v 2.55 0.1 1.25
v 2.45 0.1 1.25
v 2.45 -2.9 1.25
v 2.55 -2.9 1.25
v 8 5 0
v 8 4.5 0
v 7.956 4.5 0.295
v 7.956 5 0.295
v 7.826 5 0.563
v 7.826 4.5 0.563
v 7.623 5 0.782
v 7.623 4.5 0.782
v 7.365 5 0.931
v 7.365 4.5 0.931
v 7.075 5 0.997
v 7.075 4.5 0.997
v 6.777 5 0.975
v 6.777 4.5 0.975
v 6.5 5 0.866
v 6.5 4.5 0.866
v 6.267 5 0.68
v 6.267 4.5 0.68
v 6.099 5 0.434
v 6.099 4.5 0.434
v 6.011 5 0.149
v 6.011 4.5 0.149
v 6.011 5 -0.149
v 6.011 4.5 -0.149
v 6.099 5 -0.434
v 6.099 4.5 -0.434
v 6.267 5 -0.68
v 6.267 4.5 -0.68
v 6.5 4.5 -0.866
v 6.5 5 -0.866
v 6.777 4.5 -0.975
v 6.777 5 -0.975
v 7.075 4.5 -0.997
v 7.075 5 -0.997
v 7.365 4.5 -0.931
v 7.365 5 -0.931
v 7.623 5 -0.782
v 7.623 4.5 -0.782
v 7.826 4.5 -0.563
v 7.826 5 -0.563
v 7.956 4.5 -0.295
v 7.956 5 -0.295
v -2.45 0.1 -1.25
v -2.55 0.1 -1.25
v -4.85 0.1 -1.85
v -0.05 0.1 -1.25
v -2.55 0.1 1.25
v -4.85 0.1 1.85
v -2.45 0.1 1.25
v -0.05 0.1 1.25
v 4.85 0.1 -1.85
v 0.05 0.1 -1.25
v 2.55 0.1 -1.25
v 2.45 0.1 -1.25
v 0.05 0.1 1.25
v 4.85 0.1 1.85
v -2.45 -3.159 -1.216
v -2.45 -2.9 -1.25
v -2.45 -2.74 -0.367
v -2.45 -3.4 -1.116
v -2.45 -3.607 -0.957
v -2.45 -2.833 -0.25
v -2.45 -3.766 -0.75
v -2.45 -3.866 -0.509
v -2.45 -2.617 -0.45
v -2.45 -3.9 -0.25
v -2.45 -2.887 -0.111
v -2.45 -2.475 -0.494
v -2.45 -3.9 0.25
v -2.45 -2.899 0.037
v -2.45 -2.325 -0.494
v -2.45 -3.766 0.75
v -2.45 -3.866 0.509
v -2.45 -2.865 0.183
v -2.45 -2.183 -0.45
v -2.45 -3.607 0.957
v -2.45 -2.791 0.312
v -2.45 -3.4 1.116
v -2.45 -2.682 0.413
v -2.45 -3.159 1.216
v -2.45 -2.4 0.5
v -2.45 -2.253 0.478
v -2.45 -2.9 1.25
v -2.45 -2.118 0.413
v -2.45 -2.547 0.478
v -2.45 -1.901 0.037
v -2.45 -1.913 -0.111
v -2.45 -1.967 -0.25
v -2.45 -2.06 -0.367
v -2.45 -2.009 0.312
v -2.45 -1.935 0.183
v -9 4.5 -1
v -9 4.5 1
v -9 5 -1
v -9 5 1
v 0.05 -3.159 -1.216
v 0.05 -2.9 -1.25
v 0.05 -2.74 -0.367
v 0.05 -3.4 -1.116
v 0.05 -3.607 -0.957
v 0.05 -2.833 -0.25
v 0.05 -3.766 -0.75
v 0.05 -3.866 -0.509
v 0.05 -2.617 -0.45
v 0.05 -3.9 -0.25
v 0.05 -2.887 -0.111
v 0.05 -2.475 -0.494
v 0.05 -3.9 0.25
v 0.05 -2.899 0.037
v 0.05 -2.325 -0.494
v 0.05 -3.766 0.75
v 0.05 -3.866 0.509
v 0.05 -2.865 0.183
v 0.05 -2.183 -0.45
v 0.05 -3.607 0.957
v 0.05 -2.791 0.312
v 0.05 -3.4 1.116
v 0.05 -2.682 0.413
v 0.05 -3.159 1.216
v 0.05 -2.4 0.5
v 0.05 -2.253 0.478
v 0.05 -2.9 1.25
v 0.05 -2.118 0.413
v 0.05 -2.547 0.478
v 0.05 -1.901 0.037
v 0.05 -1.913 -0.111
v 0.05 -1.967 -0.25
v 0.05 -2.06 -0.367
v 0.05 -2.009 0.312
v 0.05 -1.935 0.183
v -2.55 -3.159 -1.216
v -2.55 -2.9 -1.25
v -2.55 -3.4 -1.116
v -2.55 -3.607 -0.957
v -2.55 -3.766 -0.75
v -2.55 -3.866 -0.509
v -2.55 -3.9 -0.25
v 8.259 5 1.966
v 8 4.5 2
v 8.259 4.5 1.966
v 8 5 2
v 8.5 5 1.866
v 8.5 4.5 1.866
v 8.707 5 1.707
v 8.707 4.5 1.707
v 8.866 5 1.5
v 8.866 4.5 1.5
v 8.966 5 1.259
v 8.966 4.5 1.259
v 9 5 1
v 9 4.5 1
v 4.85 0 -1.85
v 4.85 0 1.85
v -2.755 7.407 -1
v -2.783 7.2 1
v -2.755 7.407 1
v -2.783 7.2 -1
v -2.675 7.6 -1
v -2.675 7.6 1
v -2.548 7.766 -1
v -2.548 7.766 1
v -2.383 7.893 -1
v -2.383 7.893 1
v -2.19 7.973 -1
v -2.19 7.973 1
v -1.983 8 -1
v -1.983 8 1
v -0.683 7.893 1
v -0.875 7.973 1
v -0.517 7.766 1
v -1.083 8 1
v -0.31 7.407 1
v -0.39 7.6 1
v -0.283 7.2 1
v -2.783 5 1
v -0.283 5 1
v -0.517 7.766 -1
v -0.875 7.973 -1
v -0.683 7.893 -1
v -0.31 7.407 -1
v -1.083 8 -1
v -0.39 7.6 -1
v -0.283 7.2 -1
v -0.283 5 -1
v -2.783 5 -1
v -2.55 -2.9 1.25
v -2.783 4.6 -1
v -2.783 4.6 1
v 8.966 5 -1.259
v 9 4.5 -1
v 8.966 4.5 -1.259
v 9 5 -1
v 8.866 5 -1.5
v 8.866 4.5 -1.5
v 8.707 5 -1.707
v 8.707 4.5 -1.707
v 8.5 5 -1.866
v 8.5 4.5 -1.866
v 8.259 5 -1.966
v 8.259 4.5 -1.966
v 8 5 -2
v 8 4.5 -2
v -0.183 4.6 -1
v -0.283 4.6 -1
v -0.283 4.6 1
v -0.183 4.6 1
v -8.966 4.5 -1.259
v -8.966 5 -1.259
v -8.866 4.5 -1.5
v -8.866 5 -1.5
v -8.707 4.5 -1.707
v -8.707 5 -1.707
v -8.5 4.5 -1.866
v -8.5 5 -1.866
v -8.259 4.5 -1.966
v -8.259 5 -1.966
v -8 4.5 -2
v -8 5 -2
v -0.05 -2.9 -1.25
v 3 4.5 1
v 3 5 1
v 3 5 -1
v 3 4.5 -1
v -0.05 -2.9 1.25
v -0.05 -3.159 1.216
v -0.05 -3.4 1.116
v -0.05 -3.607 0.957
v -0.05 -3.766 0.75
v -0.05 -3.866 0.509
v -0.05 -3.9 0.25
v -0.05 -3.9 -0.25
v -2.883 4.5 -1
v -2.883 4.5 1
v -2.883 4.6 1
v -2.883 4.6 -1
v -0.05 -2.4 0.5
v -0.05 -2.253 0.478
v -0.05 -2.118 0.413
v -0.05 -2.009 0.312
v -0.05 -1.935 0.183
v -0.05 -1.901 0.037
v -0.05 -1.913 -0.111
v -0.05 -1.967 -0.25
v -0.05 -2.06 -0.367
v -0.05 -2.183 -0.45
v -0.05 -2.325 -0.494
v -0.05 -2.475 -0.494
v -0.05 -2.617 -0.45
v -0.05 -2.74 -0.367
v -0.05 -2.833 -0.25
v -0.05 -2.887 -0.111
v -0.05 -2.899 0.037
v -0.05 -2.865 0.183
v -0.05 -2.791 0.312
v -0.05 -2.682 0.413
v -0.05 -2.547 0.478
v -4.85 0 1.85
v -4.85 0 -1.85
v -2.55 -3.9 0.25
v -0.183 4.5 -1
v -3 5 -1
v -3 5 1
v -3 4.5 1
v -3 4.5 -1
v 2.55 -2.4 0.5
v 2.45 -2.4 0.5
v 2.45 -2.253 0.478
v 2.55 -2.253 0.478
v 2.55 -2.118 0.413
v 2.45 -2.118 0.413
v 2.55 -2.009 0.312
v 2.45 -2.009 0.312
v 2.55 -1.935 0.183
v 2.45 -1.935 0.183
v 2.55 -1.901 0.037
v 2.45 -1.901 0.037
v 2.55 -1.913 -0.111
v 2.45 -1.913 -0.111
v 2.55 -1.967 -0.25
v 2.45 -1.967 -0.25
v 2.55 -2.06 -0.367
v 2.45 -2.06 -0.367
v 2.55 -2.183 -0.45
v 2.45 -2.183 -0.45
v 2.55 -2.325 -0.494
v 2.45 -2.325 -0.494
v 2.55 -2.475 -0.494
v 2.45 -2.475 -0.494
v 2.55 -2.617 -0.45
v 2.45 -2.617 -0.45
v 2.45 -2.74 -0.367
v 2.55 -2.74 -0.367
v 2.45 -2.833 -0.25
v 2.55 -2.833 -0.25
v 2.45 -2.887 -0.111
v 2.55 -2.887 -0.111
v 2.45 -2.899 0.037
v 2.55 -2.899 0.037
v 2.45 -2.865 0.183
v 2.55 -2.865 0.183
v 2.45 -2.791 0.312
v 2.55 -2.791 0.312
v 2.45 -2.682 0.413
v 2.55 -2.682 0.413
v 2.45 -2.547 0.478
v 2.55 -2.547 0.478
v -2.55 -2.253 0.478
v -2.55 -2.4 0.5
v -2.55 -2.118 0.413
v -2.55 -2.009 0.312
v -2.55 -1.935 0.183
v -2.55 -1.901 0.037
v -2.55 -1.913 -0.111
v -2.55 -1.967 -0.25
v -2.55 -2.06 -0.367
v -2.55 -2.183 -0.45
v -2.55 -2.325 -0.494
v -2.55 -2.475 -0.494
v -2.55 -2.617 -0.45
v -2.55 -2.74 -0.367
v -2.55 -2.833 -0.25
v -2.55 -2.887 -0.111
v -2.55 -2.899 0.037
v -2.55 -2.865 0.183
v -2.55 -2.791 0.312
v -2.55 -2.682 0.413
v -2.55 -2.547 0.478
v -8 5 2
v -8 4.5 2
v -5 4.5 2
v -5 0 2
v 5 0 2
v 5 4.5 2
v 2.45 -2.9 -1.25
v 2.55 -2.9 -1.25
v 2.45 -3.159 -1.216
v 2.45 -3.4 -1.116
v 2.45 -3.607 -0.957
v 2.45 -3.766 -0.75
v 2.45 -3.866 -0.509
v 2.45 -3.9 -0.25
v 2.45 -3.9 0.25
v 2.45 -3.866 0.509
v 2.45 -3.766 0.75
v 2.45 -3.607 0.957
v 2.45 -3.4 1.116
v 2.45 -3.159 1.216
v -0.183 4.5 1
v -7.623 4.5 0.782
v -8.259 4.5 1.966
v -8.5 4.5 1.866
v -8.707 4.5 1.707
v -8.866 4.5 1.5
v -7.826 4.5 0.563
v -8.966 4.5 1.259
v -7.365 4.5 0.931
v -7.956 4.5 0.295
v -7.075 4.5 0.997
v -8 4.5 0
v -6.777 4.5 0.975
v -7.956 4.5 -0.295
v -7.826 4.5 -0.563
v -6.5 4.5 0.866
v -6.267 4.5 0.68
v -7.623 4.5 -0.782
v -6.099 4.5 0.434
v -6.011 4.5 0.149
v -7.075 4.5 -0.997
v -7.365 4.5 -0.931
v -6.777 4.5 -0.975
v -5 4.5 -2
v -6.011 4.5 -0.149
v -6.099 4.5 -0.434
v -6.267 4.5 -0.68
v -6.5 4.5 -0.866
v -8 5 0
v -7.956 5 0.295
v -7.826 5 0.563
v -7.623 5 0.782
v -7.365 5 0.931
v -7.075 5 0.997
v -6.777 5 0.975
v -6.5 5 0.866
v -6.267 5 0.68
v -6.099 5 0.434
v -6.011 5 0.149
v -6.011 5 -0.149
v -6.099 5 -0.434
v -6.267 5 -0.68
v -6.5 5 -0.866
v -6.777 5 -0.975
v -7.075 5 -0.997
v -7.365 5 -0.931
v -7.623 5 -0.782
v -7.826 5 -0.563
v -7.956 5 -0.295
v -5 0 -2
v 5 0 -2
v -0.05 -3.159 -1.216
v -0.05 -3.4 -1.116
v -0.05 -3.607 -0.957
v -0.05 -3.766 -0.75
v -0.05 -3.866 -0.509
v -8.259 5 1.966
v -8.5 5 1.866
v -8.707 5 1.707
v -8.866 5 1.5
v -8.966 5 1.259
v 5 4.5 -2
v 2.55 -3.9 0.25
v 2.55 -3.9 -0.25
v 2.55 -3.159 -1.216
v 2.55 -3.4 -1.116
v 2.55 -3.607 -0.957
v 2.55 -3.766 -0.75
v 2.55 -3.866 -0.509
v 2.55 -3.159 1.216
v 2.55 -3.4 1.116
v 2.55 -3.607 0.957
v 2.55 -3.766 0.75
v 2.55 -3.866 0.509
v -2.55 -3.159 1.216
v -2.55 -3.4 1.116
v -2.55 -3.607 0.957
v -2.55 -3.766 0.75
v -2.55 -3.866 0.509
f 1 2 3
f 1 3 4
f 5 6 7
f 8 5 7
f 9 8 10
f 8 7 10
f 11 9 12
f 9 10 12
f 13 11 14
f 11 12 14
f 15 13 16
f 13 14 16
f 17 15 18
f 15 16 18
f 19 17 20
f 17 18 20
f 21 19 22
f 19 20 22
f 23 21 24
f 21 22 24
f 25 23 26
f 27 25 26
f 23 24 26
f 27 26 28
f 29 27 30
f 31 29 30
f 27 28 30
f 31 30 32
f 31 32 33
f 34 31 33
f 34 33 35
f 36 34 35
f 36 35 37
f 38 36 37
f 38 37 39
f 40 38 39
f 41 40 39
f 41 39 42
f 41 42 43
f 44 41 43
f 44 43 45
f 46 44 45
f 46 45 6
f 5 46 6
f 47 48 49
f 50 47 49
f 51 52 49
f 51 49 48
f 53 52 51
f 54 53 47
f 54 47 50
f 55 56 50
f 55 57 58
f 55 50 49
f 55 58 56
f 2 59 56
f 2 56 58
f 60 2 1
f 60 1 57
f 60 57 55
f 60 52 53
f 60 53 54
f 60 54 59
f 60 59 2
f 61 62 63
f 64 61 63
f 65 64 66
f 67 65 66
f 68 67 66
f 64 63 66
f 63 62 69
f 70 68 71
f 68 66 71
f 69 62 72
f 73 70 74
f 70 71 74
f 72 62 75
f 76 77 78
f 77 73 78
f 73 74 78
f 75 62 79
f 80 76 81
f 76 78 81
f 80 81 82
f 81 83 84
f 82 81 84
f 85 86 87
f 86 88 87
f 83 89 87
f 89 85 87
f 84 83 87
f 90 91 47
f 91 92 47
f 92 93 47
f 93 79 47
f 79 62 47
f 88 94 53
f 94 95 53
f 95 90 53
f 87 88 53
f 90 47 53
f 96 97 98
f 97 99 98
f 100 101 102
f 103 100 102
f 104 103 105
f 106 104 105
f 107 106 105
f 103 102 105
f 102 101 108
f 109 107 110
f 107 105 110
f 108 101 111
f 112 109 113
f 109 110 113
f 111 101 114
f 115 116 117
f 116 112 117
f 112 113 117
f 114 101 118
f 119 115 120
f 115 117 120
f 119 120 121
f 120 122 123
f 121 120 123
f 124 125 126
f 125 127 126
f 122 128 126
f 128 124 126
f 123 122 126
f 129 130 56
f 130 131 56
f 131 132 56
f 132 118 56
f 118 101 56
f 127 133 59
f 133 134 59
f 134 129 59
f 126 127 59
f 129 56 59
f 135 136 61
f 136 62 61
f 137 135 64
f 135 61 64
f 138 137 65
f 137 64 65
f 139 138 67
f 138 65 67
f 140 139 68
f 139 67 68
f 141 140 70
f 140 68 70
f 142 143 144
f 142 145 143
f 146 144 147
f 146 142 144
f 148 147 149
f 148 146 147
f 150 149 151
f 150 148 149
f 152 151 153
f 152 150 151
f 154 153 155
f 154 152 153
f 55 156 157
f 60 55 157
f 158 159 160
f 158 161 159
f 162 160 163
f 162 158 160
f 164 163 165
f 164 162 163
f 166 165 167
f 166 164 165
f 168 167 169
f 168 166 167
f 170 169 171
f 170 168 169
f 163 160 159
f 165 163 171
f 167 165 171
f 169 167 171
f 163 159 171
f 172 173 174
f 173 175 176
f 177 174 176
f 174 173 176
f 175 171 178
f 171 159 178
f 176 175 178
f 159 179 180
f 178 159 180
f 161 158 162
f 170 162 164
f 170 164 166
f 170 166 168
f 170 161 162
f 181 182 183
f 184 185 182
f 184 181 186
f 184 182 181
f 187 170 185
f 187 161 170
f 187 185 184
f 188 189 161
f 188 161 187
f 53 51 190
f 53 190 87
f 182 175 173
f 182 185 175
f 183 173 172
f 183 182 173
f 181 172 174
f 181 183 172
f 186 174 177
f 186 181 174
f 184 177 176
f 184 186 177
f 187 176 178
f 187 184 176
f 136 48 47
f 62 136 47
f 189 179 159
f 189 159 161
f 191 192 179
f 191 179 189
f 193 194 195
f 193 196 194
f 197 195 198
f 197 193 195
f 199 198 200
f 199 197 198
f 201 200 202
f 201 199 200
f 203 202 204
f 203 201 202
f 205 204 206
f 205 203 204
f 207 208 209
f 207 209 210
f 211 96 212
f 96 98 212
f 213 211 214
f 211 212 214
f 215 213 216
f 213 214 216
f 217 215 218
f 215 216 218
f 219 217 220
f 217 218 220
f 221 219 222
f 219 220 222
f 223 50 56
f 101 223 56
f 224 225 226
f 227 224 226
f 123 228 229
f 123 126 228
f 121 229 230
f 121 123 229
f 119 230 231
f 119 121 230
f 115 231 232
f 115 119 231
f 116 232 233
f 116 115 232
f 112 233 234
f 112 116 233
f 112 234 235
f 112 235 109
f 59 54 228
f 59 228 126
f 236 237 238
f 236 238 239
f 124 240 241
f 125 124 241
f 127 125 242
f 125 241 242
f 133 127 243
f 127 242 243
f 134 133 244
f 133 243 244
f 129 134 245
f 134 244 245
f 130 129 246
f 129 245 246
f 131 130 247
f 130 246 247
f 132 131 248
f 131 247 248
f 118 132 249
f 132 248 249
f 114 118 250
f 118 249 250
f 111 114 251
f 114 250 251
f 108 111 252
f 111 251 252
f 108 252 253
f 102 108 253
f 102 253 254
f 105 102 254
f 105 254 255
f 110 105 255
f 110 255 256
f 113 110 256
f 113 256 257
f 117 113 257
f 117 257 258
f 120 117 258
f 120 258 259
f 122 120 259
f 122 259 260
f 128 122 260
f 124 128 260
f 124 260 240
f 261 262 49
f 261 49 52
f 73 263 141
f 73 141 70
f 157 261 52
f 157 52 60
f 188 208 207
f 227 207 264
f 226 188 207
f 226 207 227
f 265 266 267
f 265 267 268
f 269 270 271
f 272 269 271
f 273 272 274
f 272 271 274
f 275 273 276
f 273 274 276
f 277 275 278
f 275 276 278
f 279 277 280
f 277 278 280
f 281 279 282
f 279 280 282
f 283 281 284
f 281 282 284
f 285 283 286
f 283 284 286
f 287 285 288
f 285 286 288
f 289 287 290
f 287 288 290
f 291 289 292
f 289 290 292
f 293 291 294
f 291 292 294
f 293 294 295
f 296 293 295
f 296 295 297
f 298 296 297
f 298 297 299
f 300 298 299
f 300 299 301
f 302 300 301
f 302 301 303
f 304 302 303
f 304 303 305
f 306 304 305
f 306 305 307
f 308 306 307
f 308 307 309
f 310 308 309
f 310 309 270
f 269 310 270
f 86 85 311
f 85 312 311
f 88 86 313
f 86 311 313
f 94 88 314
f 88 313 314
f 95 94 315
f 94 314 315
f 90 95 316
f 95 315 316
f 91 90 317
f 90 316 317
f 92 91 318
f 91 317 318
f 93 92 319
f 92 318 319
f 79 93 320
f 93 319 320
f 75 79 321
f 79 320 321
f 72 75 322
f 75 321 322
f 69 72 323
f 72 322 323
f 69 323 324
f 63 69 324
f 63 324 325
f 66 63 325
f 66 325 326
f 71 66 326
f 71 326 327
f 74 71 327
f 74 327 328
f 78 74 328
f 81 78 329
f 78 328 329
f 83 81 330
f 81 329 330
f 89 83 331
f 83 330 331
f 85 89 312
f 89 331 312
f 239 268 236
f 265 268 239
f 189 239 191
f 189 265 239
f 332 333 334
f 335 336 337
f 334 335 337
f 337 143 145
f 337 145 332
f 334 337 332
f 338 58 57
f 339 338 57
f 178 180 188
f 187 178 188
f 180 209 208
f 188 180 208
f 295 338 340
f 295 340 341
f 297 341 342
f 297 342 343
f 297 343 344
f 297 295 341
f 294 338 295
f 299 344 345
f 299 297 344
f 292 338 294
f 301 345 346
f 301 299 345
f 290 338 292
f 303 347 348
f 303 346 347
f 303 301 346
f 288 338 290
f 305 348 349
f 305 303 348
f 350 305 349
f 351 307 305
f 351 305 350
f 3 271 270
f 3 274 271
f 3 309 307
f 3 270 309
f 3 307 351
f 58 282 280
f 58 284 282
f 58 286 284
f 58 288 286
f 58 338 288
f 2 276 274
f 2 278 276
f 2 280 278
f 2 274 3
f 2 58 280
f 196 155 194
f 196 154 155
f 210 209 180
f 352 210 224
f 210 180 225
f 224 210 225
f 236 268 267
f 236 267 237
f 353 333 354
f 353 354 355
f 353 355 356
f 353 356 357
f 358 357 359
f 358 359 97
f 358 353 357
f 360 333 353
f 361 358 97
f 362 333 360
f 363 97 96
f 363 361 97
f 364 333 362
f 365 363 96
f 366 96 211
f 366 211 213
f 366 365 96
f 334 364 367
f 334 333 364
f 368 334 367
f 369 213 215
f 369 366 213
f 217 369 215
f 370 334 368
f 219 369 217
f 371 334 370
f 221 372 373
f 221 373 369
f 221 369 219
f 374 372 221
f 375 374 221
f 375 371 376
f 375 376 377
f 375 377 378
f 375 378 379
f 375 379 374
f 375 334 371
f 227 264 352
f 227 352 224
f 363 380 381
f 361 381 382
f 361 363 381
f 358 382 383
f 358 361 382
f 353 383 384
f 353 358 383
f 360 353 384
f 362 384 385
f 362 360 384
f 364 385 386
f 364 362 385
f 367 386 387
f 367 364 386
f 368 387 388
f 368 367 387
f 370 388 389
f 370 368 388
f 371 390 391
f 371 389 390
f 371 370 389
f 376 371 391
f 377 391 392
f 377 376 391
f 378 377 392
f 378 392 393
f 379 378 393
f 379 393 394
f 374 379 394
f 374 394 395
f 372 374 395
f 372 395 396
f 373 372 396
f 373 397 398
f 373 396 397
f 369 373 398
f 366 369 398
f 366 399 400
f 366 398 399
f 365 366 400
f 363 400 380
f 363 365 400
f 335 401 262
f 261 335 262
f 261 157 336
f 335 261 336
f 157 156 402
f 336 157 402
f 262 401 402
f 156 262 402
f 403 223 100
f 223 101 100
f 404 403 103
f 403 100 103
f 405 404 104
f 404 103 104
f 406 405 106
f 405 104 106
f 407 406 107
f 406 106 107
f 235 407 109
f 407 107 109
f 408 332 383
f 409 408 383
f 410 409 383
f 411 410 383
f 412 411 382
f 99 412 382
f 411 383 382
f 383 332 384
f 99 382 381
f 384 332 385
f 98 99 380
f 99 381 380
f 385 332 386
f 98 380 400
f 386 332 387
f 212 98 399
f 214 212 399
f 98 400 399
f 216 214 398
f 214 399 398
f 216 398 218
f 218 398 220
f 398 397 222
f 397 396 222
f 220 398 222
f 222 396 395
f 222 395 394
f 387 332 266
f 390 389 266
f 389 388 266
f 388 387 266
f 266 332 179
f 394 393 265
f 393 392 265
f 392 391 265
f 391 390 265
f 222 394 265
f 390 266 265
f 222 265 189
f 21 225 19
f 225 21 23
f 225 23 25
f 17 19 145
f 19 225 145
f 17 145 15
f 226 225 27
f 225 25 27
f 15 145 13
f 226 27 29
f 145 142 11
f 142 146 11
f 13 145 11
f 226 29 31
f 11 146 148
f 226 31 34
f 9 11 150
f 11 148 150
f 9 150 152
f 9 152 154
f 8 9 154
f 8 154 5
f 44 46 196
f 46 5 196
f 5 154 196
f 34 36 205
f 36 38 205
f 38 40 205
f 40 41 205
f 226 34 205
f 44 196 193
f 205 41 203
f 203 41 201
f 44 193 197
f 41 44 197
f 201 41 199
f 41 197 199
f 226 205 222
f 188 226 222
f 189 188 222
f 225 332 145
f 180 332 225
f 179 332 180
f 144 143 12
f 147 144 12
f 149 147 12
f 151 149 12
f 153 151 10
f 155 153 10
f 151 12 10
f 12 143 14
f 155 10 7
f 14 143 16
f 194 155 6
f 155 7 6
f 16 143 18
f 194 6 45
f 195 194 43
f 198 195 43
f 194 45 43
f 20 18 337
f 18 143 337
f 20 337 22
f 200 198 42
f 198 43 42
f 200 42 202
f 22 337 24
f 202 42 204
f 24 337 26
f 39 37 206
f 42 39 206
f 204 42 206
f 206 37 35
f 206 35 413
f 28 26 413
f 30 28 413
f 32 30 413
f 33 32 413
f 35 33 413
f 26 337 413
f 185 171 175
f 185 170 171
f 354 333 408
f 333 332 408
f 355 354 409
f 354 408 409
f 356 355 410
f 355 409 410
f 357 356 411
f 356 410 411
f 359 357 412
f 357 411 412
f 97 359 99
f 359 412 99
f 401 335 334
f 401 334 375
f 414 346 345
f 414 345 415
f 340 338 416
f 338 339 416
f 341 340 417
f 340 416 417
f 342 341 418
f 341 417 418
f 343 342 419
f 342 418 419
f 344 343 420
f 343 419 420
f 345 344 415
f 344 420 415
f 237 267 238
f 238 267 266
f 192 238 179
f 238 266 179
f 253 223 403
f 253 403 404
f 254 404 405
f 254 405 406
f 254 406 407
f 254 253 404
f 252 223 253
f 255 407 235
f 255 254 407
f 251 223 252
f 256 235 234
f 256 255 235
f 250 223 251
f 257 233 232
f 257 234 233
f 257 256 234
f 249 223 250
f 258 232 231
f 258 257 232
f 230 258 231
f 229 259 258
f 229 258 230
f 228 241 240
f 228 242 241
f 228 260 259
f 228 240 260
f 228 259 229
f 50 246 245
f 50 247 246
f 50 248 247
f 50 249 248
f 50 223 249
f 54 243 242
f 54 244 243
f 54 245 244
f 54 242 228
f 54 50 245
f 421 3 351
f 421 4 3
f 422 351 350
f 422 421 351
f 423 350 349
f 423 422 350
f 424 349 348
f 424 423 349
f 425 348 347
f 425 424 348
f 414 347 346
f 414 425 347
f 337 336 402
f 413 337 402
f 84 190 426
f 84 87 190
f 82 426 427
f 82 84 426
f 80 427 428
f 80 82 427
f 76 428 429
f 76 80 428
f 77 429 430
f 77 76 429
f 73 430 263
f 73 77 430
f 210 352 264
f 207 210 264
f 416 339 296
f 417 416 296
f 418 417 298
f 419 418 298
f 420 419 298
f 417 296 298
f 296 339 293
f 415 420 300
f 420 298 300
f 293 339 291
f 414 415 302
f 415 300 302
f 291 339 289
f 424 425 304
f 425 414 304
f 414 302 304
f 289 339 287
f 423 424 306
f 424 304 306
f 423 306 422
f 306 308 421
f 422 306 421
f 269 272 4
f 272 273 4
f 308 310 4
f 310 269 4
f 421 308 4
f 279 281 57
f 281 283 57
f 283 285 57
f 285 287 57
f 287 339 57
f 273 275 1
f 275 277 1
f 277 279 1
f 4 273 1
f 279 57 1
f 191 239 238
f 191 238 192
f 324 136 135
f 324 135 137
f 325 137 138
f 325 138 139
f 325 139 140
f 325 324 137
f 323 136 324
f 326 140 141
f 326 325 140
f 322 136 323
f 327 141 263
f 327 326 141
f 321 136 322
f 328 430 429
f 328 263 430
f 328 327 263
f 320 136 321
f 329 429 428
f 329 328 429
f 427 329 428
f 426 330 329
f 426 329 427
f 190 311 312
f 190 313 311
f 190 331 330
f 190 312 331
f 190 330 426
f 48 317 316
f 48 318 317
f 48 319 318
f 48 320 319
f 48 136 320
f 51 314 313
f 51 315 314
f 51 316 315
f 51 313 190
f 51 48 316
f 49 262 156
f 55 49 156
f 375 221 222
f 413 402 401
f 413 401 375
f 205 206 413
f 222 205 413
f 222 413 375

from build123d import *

# Parameters (mm, degrees)
SKETCH2_W                  = 10
SKETCH2_H                  = 4
BOSS_EXTRUDE1_DEPTH        = 5
SKETCH3_W                  = 6
SKETCH3_H                  = 2
CUT_EXTRUDE1_DEPTH         = 0.5
SKETCH4_W                  = 4
SKETCH4_H                  = 0.5
BOSS_EXTRUDE2_DEPTH        = 4
SKETCH5_R                  = 1
CUT_EXTRUDE2_DEPTH         = 1.5
FILLET1_R                  = 1
SKETCH6_W                  = 2.5
SKETCH6_H                  = 2
BOSS_EXTRUDE3_DEPTH        = 3.5
FILLET2_R                  = 0.8
SKETCH7_W                  = 0.1
SKETCH7_H                  = 2
BOSS_EXTRUDE4_DEPTH        = 0.1
SKETCH8_W                  = 9.7
SKETCH8_H                  = 3.7
CUT_EXTRUDE3_DEPTH         = 0.1
SKETCH9_W                  = 0.1
SKETCH9_H                  = 2.5
BOSS_EXTRUDE5_DEPTH        = 4
FILLET3_R                  = 1
SKETCH10_R                 = 0.5
CUT_EXTRUDE4_DEPTH         = 10.05
LPATTERN1_COUNT            = 2
LPATTERN1_PITCH            = 2.5
FILLET3_OF_LPATTERN1_R     = 1
LPATTERN1_COL_COUNT        = 2
LPATTERN1_COL_PITCH        = 2.5
FILLET3_OF_LPATTERN1_COL_R = 1


with BuildPart() as part:
    # Sketch2 → Boss-Extrude1 (new body)
    with BuildSketch(Plane(origin=(0, 0, 0), x_dir=(1, 0, 0), z_dir=(0, 1, 0))):
        Rectangle(SKETCH2_W, SKETCH2_H)
    extrude(amount=BOSS_EXTRUDE1_DEPTH)

    # Sketch3 → Cut-Extrude1 (cut)
    with BuildSketch(Plane(origin=(0, 5, 0), x_dir=(1, 0, 0), z_dir=(0, 1, 0))):
        Rectangle(SKETCH3_W, SKETCH3_H)
    extrude(amount=-CUT_EXTRUDE1_DEPTH, mode=Mode.SUBTRACT)

    # Sketch4 → Boss-Extrude2 (add)
    with BuildSketch(Plane(origin=(5, 0, 0), x_dir=(0, 0, -1), z_dir=(1, 0, 0))):
        with Locations((0, 4.75)):
            Rectangle(SKETCH4_W, SKETCH4_H)
    boss_extrude2 = extrude(amount=BOSS_EXTRUDE2_DEPTH)

    # Sketch5 → Cut-Extrude2 (cut, through all)
    with BuildSketch(Plane.XZ.offset(-4.5)):
        with Locations((7, 0)):
            Circle(SKETCH5_R)
    cut_extrude2 = extrude(amount=-CUT_EXTRUDE2_DEPTH, mode=Mode.SUBTRACT)

    # Mirror3: Boss-Extrude2, Cut-Extrude2 across plane
    add(boss_extrude2.mirror(Plane(origin=(0, 0, 0), x_dir=(0, 0, 1), z_dir=(1, 0, 0))))
    add(cut_extrude2.mirror(Plane(origin=(0, 0, 0), x_dir=(0, 0, 1), z_dir=(1, 0, 0))), mode=Mode.SUBTRACT)

    # Fillet1
    fillet1_edges = [part.edges().sort_by_distance(p)[0] for p in [
        (9, 4.75, 2),
        (9, 4.75, -2),
        (-9, 4.75, 2),
        (-9, 4.75, -2),
    ]]
    fillet(fillet1_edges, radius=FILLET1_R)

    # Sketch6 → Boss-Extrude3 (add)
    with BuildSketch(Plane(origin=(0, 4.5, 0), x_dir=(1, 0, 0), z_dir=(0, 1, 0))):
        with Locations((-1.53254506, 0)):
            Rectangle(SKETCH6_W, SKETCH6_H)
    extrude(amount=BOSS_EXTRUDE3_DEPTH)

    # Fillet2
    fillet2_edges = [part.edges().sort_by_distance(p)[0] for p in [
        (-2.78254506, 8, 0),
        (-0.28254506, 8, 0),
    ]]
    fillet(fillet2_edges, radius=FILLET2_R)

    # Sketch7 → Boss-Extrude4 (add)
    with BuildSketch(Plane(origin=(0, 4.5, 0), x_dir=(1, 0, 0), z_dir=(0, 1, 0))):
        with Locations((-0.23254506, 0)):
            Rectangle(SKETCH7_W, SKETCH7_H)
        with Locations((-2.83254506, 0)):
            Rectangle(SKETCH7_W, SKETCH7_H)
    extrude(amount=BOSS_EXTRUDE4_DEPTH)

    # Sketch8 → Cut-Extrude3 (cut)
    with BuildSketch(Plane.XZ):
        Rectangle(SKETCH8_W, SKETCH8_H)
    extrude(amount=-CUT_EXTRUDE3_DEPTH, mode=Mode.SUBTRACT)

    # Sketch9 → Boss-Extrude5 (add)
    with BuildSketch(Plane.XZ.offset(-0.1)):
        Rectangle(SKETCH9_W, SKETCH9_H)
    boss_extrude5 = extrude(amount=BOSS_EXTRUDE5_DEPTH)

    # Fillet3
    fillet3_edges = [part.edges().sort_by_distance(p)[0] for p in [
        (0, -3.9, 1.25),
        (0, -3.9, -1.25),
    ]]
    fillet(fillet3_edges, radius=FILLET3_R)

    # Sketch10 → Cut-Extrude4 (cut, through all)
    with BuildSketch(Plane.ZY.offset(0.05)):
        with Locations((0, -2.4)):
            Circle(SKETCH10_R)
    cut_extrude4 = extrude(amount=-CUT_EXTRUDE4_DEPTH, mode=Mode.SUBTRACT)

    # LPattern1: Boss-Extrude5, Cut-Extrude4 ×2
    with Locations(*[(i * LPATTERN1_PITCH, 0, 0) for i in range(1, LPATTERN1_COUNT)]):
        add(boss_extrude5)
        add(cut_extrude4, mode=Mode.SUBTRACT)

    # Fillet3 of LPattern1
    fillet3_of_lpattern1_edges = [part.edges().sort_by_distance(p)[0] for p in [
        (2.5, -3.9, 1.25),
        (2.5, -3.9, -1.25),
    ]]
    fillet(fillet3_of_lpattern1_edges, radius=FILLET3_OF_LPATTERN1_R)

    # LPattern1 col: Boss-Extrude5, Cut-Extrude4 ×2
    with Locations(*[(-i * LPATTERN1_COL_PITCH, 0, 0) for i in range(1, LPATTERN1_COL_COUNT)]):
        add(boss_extrude5)
        add(cut_extrude4, mode=Mode.SUBTRACT)

    # Fillet3 of LPattern1 col
    fillet3_of_lpattern1_col_edges = [part.edges().sort_by_distance(p)[0] for p in [
        (-2.5, -3.9, 1.25),
        (-2.5, -3.9, -1.25),
    ]]
    fillet(fillet3_of_lpattern1_col_edges, radius=FILLET3_OF_LPATTERN1_COL_R)


solid = part.part
